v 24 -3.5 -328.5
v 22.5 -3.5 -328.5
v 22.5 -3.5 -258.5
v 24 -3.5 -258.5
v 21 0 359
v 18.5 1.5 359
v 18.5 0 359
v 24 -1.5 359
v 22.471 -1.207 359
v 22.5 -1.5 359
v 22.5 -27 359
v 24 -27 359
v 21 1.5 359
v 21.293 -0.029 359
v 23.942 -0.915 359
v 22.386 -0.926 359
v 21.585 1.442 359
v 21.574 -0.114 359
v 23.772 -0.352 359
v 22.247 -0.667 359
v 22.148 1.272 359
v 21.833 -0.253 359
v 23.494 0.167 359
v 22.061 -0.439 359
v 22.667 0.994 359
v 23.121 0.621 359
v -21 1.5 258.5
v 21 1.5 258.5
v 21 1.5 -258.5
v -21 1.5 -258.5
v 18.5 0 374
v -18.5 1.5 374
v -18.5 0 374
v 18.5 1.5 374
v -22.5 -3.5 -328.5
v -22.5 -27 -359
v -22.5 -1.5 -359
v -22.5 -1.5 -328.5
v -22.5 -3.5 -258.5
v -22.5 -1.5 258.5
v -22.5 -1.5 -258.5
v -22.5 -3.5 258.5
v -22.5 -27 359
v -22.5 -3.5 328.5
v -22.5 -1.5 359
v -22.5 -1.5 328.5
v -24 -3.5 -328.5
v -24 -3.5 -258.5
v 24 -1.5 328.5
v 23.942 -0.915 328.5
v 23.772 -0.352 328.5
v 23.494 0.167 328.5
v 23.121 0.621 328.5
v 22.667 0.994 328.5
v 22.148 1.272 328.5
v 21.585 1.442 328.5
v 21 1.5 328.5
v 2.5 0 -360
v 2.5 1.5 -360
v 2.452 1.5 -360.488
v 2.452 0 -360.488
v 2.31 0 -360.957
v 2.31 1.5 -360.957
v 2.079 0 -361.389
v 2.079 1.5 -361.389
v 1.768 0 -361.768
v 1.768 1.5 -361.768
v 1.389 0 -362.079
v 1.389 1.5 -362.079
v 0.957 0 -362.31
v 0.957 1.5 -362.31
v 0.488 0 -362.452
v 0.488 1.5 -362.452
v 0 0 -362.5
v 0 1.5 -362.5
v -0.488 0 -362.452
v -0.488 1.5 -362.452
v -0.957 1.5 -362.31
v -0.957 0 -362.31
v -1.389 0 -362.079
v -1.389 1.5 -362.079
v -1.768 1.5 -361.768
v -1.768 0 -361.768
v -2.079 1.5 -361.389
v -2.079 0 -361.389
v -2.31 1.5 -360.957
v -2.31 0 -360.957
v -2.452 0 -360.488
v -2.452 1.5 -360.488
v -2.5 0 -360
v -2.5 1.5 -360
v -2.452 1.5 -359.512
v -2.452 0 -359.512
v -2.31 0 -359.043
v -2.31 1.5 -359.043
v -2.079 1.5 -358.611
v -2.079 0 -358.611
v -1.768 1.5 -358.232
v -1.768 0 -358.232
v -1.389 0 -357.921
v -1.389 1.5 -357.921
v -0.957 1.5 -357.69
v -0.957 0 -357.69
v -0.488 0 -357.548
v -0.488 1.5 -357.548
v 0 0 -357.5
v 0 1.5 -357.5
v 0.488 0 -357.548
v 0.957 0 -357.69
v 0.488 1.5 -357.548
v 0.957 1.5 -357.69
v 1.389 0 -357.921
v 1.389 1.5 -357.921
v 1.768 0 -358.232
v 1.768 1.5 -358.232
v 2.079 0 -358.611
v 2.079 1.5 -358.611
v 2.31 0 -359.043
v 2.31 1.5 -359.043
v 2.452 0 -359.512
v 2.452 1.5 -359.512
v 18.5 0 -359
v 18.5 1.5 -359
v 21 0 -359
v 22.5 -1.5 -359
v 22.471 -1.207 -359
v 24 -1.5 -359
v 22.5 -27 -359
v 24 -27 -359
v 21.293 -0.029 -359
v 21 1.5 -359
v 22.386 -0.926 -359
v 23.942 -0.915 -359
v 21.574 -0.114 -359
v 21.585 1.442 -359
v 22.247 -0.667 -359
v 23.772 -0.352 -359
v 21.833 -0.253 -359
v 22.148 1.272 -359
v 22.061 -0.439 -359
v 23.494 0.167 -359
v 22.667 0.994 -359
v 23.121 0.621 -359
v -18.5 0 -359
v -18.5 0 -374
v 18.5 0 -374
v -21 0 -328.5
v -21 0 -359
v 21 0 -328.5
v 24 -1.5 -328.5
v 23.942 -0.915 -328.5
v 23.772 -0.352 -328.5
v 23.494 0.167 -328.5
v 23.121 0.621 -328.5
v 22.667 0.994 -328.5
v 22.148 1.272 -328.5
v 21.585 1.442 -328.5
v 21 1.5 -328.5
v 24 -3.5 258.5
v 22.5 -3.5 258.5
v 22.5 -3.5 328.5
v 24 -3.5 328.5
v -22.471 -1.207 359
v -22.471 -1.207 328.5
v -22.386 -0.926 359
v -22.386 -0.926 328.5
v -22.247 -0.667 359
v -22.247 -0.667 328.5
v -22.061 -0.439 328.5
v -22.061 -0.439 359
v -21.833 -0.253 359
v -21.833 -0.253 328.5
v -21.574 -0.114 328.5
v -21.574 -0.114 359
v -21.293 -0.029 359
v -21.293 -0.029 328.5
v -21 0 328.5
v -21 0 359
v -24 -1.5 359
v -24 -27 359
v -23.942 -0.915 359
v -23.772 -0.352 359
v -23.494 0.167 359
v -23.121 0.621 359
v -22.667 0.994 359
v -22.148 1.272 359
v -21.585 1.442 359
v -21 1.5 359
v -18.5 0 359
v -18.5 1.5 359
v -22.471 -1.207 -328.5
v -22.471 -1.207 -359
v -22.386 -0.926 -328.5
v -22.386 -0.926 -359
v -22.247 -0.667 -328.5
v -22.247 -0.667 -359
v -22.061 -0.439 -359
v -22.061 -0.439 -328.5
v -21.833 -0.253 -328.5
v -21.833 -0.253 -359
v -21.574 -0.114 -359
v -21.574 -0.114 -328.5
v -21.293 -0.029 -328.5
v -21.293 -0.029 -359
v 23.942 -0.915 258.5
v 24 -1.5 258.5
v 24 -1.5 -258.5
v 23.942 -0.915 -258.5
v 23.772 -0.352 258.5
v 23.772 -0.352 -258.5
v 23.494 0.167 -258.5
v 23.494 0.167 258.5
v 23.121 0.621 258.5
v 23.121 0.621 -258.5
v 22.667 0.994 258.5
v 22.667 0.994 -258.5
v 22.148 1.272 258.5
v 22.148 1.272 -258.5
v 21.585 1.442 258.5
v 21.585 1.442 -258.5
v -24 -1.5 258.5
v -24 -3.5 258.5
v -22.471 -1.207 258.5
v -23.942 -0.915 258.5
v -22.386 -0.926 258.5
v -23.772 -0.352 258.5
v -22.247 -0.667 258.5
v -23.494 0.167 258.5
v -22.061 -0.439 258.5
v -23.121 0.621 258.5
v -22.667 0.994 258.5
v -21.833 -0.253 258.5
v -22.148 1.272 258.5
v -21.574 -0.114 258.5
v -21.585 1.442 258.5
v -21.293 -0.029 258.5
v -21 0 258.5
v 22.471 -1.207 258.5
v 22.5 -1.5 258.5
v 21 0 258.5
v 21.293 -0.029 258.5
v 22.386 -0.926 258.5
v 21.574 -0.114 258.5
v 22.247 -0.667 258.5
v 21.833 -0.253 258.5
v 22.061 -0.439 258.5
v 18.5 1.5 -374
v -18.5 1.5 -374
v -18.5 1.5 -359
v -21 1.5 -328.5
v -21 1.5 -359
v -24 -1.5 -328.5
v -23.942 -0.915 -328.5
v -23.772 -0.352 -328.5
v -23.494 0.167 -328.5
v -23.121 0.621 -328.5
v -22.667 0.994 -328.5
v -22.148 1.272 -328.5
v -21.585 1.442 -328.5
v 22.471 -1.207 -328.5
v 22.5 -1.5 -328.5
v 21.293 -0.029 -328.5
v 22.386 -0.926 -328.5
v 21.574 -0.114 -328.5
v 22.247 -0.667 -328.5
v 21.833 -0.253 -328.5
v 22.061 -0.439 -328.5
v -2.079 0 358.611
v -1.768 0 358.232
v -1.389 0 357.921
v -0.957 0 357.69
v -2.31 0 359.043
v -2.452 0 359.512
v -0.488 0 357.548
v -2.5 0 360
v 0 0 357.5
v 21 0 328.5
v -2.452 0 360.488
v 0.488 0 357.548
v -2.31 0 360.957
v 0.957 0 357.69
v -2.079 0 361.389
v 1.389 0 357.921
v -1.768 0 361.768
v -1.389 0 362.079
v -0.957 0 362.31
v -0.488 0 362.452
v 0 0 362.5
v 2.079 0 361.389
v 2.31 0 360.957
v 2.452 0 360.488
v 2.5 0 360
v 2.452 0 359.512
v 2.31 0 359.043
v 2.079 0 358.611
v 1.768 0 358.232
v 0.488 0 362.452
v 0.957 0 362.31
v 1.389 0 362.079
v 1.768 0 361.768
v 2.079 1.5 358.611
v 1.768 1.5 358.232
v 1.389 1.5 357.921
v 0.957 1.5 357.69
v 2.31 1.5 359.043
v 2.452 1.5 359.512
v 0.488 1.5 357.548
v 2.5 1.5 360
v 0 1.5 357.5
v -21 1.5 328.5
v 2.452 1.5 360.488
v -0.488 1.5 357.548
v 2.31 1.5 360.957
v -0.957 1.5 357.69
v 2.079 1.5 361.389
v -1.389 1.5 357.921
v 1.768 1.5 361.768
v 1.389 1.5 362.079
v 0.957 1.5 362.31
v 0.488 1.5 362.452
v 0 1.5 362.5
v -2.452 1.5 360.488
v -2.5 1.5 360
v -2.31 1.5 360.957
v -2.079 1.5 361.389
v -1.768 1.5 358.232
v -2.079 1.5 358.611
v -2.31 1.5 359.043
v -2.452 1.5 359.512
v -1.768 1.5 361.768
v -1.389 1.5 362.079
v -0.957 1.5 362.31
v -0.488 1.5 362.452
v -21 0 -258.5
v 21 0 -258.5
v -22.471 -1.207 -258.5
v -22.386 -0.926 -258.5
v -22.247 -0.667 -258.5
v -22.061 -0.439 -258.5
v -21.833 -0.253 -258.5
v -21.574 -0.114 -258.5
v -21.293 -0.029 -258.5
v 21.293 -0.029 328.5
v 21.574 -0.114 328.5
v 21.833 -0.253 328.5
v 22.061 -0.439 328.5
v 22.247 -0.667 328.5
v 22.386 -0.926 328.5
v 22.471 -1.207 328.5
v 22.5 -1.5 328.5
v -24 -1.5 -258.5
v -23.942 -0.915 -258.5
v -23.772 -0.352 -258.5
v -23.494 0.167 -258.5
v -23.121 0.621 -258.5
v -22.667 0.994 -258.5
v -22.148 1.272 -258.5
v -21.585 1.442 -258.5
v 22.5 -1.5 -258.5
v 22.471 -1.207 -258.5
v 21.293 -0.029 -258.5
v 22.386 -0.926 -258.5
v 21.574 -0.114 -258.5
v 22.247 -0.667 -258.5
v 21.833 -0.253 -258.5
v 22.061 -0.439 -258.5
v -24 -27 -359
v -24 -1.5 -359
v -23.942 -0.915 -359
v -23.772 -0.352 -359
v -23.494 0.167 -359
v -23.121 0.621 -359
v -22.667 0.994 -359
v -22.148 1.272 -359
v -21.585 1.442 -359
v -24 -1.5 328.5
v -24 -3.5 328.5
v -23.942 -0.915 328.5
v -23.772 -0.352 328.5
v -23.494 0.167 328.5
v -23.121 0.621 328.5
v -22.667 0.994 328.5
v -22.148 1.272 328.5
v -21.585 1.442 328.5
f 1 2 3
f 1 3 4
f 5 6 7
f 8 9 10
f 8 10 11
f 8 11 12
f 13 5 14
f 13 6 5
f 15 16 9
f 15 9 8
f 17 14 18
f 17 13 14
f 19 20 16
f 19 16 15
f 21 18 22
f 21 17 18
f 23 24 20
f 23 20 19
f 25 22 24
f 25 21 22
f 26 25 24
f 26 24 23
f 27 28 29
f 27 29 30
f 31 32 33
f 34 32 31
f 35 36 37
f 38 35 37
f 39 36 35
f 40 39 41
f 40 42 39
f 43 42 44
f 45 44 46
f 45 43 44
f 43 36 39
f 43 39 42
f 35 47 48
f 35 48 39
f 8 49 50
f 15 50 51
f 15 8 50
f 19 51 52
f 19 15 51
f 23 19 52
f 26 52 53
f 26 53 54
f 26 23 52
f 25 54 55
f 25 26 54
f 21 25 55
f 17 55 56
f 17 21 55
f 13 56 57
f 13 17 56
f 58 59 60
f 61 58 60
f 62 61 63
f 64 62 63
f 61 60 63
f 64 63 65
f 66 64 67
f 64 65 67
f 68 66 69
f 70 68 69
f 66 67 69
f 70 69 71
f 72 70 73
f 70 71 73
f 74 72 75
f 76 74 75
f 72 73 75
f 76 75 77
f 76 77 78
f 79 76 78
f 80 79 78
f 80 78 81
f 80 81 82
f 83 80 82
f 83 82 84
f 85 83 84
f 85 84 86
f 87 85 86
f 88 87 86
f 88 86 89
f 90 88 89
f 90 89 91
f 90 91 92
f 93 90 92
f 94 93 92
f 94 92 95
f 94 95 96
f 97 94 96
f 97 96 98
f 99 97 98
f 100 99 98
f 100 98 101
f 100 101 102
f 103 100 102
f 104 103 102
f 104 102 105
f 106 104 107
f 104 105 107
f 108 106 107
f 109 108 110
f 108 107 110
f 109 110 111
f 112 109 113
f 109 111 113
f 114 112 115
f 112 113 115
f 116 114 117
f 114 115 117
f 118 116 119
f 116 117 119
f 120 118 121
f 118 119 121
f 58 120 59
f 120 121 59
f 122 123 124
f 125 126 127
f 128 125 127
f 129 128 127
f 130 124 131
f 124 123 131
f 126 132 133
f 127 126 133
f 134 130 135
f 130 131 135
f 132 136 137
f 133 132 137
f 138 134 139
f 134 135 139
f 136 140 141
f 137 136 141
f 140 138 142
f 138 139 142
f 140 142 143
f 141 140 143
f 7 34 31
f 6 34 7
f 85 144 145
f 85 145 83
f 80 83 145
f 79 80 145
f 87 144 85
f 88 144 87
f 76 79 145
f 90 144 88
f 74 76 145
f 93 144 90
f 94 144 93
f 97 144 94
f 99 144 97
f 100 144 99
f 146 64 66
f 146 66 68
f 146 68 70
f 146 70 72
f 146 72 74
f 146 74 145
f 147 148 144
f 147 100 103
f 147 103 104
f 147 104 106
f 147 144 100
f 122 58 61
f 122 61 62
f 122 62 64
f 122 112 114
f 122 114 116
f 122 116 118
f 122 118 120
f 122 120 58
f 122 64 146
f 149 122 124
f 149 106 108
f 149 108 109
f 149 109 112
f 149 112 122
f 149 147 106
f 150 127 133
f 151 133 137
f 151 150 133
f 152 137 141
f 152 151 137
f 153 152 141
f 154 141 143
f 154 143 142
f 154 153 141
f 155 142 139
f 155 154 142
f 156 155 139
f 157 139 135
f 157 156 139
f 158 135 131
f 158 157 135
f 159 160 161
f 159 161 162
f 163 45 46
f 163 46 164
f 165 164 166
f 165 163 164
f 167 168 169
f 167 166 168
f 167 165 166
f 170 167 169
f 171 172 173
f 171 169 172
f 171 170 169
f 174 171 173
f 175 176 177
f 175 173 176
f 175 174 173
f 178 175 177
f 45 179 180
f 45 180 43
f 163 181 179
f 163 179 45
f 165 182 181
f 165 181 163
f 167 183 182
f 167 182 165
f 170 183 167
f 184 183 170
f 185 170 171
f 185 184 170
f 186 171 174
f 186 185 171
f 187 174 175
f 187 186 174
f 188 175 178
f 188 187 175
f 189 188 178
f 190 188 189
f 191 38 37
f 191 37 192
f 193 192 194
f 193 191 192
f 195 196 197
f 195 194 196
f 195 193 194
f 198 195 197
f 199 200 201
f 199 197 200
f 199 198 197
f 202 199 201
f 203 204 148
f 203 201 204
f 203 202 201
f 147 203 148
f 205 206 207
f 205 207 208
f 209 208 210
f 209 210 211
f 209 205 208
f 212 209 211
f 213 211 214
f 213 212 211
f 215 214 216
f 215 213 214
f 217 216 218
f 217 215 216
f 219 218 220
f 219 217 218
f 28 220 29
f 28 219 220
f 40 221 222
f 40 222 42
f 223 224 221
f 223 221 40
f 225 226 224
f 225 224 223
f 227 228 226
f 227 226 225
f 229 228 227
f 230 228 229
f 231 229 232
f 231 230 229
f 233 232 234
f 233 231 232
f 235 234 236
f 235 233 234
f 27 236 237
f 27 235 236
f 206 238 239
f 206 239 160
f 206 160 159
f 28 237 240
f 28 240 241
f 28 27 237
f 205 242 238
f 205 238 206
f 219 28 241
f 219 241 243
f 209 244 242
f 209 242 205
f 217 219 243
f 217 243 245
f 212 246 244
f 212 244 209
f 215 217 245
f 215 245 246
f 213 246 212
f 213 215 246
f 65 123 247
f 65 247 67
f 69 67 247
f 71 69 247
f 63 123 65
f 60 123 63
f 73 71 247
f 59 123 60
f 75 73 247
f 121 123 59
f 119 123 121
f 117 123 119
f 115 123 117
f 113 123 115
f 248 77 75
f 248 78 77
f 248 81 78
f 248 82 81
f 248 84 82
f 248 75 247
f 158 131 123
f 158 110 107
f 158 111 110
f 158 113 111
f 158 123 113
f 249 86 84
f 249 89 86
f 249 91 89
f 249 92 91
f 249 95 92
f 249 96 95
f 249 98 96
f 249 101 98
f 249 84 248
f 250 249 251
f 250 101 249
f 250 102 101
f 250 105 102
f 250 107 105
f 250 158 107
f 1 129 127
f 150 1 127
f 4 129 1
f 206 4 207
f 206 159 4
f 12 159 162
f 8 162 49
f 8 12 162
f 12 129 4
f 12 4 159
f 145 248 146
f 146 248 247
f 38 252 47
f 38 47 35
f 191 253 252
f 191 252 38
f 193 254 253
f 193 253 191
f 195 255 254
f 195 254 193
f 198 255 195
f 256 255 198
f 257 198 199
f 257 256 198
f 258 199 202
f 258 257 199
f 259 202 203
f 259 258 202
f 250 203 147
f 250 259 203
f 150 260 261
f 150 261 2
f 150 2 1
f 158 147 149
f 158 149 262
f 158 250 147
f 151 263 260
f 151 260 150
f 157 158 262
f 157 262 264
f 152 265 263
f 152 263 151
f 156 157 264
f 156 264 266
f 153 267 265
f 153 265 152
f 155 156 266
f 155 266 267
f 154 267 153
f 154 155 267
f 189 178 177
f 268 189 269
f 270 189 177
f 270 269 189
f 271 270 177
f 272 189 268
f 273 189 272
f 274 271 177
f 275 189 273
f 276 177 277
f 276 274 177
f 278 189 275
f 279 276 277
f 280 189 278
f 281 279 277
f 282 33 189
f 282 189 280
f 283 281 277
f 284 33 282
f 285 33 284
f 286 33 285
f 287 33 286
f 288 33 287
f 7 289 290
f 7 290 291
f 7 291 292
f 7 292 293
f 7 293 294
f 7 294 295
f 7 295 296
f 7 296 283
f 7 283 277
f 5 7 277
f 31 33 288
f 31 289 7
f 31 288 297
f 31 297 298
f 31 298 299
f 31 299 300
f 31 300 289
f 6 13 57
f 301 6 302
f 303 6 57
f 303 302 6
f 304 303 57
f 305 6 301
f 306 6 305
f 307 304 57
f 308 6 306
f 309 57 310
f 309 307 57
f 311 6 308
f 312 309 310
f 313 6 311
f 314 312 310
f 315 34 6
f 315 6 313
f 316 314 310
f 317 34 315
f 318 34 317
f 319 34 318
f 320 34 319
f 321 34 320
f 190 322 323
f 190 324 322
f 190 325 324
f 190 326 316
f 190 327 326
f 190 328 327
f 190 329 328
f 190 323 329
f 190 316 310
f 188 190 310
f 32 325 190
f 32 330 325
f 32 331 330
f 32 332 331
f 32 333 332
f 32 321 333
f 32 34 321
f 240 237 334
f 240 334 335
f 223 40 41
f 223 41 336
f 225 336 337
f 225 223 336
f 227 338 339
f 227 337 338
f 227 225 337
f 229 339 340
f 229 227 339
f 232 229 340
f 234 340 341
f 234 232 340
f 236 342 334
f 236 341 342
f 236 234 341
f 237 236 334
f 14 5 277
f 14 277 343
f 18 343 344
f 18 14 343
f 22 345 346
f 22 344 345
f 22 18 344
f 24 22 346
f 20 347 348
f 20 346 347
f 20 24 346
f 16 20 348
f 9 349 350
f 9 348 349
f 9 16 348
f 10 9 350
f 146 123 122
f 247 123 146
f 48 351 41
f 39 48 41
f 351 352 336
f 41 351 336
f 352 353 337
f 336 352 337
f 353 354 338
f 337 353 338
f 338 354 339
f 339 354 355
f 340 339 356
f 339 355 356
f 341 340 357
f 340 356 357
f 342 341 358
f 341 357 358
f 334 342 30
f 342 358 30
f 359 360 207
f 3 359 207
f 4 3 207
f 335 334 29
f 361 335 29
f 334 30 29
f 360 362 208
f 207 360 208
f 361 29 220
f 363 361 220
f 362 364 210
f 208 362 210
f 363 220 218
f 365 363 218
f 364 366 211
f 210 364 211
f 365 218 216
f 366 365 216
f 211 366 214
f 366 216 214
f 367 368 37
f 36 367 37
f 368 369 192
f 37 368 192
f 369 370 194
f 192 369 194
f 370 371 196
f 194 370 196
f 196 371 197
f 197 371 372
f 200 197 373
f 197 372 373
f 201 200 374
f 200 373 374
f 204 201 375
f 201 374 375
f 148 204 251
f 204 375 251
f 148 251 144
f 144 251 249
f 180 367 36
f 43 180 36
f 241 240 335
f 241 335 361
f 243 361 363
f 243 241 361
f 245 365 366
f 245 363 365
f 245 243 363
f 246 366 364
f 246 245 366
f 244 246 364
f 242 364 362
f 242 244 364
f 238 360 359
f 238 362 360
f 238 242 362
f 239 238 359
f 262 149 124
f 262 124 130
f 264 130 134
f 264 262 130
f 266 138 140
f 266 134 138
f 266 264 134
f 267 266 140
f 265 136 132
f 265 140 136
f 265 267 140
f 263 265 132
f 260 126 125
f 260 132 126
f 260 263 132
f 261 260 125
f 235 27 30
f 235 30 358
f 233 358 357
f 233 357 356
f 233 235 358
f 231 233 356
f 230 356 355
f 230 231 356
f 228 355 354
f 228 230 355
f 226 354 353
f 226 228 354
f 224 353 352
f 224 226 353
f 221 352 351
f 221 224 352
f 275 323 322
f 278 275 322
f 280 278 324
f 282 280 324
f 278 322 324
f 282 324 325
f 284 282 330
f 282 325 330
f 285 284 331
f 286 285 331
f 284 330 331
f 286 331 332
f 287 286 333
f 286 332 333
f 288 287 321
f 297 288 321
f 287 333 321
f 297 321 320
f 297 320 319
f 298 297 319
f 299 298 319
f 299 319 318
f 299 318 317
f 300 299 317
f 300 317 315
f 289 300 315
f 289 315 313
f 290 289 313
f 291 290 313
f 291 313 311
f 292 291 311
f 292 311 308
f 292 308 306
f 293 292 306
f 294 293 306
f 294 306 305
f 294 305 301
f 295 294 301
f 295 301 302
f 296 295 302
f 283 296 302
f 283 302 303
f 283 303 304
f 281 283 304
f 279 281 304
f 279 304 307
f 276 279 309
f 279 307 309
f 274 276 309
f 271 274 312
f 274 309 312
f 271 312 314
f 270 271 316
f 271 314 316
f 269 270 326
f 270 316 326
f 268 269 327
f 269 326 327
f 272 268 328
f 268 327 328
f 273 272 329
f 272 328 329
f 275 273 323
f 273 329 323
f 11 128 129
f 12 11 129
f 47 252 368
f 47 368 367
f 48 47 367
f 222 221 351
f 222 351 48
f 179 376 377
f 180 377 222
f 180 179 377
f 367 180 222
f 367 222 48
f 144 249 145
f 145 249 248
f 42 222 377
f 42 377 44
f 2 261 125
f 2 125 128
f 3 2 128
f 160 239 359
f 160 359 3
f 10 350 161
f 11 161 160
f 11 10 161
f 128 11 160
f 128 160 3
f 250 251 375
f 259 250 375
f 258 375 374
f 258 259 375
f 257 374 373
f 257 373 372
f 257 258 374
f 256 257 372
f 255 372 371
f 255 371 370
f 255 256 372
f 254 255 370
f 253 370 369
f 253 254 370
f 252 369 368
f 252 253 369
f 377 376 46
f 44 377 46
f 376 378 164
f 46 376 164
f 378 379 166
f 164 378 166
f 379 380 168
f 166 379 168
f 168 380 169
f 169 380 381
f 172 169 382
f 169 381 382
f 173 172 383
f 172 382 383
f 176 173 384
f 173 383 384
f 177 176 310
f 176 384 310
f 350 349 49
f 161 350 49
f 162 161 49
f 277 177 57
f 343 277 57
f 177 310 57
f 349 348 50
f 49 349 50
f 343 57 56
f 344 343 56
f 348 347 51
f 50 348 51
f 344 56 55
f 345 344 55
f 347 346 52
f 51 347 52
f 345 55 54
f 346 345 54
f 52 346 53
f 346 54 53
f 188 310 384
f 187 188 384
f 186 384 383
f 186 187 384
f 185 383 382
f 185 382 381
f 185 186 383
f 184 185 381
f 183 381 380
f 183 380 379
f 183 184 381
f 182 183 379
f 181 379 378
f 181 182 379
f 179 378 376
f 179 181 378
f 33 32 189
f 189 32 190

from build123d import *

# Parameters (mm, degrees)
SM_BASE_FLANGE_1_DEPTH = 374
SKETCH_6_R             = 2.5
SKETCH_6_W             = 6.5
SKETCH_6_H             = 15
CUT_EXTRUDE_1_DEPTH    = 376.851366899
SKETCH_7_W             = 50
SKETCH_7_H             = 70
CUT_EXTRUDE_2_DEPTH    = 5


# Sheet-metal steps are written as plain solids
with BuildPart() as part:
    # Sketch 1 → Базовая кромка1 (new, symmetric)
    with BuildSketch(Plane.XY):
        with BuildLine():
            Line((-22.5, -27), (-22.5, -1.5))
            ThreePointArc((-22.5, -1.5), (-22.060660172, -0.439339828), (-21, 0))
            Line((-21, 0), (21, 0))
            ThreePointArc((21, 0), (22.060660172, -0.439339828), (22.5, -1.5))
            Line((22.5, -1.5), (22.5, -27))
            Line((22.5, -27), (24, -27))
            Line((24, -27), (24, -1.5))
            ThreePointArc((24, -1.5), (23.121320344, 0.621320344), (21, 1.5))
            Line((21, 1.5), (-21, 1.5))
            ThreePointArc((-21, 1.5), (-23.121320344, 0.621320344), (-24, -1.5))
            Line((-24, -1.5), (-24, -27))
            Line((-24, -27), (-22.5, -27))
        make_face()
    extrude(amount=SM_BASE_FLANGE_1_DEPTH, both=True)

    # Эскиз6 → Вырез-Вытянуть1 (cut, through all)
    with BuildSketch(Plane(origin=(0, 1.5, 0), x_dir=(1, 0, 0), z_dir=(0, 1, 0))):
        with Locations(Location((0, -360, 0), (0, 0, 180))):
            Circle(SKETCH_6_R)
        with Locations((0, 360)):
            Circle(SKETCH_6_R)
        with Locations((-21.75, -366.5)):
            Rectangle(SKETCH_6_W, SKETCH_6_H)
        with Locations((21.75, -366.5)):
            Rectangle(SKETCH_6_W, SKETCH_6_H)
        with Locations((21.75, 366.5)):
            Rectangle(SKETCH_6_W, SKETCH_6_H)
        with Locations((-21.75, 366.5)):
            Rectangle(SKETCH_6_W, SKETCH_6_H)
    extrude(amount=-CUT_EXTRUDE_1_DEPTH, mode=Mode.SUBTRACT)

    # Эскиз7 → Вырез-Вытянуть2 (cut)
    with BuildSketch(Plane(origin=(0, 1.5, 0), x_dir=(1, 0, 0), z_dir=(0, 1, 0))):
        with Locations((0, -293.5)):
            Rectangle(SKETCH_7_W, SKETCH_7_H)
        with Locations((0, 293.5)):
            Rectangle(SKETCH_7_W, SKETCH_7_H)
    extrude(amount=-CUT_EXTRUDE_2_DEPTH, mode=Mode.SUBTRACT)


solid = part.part
